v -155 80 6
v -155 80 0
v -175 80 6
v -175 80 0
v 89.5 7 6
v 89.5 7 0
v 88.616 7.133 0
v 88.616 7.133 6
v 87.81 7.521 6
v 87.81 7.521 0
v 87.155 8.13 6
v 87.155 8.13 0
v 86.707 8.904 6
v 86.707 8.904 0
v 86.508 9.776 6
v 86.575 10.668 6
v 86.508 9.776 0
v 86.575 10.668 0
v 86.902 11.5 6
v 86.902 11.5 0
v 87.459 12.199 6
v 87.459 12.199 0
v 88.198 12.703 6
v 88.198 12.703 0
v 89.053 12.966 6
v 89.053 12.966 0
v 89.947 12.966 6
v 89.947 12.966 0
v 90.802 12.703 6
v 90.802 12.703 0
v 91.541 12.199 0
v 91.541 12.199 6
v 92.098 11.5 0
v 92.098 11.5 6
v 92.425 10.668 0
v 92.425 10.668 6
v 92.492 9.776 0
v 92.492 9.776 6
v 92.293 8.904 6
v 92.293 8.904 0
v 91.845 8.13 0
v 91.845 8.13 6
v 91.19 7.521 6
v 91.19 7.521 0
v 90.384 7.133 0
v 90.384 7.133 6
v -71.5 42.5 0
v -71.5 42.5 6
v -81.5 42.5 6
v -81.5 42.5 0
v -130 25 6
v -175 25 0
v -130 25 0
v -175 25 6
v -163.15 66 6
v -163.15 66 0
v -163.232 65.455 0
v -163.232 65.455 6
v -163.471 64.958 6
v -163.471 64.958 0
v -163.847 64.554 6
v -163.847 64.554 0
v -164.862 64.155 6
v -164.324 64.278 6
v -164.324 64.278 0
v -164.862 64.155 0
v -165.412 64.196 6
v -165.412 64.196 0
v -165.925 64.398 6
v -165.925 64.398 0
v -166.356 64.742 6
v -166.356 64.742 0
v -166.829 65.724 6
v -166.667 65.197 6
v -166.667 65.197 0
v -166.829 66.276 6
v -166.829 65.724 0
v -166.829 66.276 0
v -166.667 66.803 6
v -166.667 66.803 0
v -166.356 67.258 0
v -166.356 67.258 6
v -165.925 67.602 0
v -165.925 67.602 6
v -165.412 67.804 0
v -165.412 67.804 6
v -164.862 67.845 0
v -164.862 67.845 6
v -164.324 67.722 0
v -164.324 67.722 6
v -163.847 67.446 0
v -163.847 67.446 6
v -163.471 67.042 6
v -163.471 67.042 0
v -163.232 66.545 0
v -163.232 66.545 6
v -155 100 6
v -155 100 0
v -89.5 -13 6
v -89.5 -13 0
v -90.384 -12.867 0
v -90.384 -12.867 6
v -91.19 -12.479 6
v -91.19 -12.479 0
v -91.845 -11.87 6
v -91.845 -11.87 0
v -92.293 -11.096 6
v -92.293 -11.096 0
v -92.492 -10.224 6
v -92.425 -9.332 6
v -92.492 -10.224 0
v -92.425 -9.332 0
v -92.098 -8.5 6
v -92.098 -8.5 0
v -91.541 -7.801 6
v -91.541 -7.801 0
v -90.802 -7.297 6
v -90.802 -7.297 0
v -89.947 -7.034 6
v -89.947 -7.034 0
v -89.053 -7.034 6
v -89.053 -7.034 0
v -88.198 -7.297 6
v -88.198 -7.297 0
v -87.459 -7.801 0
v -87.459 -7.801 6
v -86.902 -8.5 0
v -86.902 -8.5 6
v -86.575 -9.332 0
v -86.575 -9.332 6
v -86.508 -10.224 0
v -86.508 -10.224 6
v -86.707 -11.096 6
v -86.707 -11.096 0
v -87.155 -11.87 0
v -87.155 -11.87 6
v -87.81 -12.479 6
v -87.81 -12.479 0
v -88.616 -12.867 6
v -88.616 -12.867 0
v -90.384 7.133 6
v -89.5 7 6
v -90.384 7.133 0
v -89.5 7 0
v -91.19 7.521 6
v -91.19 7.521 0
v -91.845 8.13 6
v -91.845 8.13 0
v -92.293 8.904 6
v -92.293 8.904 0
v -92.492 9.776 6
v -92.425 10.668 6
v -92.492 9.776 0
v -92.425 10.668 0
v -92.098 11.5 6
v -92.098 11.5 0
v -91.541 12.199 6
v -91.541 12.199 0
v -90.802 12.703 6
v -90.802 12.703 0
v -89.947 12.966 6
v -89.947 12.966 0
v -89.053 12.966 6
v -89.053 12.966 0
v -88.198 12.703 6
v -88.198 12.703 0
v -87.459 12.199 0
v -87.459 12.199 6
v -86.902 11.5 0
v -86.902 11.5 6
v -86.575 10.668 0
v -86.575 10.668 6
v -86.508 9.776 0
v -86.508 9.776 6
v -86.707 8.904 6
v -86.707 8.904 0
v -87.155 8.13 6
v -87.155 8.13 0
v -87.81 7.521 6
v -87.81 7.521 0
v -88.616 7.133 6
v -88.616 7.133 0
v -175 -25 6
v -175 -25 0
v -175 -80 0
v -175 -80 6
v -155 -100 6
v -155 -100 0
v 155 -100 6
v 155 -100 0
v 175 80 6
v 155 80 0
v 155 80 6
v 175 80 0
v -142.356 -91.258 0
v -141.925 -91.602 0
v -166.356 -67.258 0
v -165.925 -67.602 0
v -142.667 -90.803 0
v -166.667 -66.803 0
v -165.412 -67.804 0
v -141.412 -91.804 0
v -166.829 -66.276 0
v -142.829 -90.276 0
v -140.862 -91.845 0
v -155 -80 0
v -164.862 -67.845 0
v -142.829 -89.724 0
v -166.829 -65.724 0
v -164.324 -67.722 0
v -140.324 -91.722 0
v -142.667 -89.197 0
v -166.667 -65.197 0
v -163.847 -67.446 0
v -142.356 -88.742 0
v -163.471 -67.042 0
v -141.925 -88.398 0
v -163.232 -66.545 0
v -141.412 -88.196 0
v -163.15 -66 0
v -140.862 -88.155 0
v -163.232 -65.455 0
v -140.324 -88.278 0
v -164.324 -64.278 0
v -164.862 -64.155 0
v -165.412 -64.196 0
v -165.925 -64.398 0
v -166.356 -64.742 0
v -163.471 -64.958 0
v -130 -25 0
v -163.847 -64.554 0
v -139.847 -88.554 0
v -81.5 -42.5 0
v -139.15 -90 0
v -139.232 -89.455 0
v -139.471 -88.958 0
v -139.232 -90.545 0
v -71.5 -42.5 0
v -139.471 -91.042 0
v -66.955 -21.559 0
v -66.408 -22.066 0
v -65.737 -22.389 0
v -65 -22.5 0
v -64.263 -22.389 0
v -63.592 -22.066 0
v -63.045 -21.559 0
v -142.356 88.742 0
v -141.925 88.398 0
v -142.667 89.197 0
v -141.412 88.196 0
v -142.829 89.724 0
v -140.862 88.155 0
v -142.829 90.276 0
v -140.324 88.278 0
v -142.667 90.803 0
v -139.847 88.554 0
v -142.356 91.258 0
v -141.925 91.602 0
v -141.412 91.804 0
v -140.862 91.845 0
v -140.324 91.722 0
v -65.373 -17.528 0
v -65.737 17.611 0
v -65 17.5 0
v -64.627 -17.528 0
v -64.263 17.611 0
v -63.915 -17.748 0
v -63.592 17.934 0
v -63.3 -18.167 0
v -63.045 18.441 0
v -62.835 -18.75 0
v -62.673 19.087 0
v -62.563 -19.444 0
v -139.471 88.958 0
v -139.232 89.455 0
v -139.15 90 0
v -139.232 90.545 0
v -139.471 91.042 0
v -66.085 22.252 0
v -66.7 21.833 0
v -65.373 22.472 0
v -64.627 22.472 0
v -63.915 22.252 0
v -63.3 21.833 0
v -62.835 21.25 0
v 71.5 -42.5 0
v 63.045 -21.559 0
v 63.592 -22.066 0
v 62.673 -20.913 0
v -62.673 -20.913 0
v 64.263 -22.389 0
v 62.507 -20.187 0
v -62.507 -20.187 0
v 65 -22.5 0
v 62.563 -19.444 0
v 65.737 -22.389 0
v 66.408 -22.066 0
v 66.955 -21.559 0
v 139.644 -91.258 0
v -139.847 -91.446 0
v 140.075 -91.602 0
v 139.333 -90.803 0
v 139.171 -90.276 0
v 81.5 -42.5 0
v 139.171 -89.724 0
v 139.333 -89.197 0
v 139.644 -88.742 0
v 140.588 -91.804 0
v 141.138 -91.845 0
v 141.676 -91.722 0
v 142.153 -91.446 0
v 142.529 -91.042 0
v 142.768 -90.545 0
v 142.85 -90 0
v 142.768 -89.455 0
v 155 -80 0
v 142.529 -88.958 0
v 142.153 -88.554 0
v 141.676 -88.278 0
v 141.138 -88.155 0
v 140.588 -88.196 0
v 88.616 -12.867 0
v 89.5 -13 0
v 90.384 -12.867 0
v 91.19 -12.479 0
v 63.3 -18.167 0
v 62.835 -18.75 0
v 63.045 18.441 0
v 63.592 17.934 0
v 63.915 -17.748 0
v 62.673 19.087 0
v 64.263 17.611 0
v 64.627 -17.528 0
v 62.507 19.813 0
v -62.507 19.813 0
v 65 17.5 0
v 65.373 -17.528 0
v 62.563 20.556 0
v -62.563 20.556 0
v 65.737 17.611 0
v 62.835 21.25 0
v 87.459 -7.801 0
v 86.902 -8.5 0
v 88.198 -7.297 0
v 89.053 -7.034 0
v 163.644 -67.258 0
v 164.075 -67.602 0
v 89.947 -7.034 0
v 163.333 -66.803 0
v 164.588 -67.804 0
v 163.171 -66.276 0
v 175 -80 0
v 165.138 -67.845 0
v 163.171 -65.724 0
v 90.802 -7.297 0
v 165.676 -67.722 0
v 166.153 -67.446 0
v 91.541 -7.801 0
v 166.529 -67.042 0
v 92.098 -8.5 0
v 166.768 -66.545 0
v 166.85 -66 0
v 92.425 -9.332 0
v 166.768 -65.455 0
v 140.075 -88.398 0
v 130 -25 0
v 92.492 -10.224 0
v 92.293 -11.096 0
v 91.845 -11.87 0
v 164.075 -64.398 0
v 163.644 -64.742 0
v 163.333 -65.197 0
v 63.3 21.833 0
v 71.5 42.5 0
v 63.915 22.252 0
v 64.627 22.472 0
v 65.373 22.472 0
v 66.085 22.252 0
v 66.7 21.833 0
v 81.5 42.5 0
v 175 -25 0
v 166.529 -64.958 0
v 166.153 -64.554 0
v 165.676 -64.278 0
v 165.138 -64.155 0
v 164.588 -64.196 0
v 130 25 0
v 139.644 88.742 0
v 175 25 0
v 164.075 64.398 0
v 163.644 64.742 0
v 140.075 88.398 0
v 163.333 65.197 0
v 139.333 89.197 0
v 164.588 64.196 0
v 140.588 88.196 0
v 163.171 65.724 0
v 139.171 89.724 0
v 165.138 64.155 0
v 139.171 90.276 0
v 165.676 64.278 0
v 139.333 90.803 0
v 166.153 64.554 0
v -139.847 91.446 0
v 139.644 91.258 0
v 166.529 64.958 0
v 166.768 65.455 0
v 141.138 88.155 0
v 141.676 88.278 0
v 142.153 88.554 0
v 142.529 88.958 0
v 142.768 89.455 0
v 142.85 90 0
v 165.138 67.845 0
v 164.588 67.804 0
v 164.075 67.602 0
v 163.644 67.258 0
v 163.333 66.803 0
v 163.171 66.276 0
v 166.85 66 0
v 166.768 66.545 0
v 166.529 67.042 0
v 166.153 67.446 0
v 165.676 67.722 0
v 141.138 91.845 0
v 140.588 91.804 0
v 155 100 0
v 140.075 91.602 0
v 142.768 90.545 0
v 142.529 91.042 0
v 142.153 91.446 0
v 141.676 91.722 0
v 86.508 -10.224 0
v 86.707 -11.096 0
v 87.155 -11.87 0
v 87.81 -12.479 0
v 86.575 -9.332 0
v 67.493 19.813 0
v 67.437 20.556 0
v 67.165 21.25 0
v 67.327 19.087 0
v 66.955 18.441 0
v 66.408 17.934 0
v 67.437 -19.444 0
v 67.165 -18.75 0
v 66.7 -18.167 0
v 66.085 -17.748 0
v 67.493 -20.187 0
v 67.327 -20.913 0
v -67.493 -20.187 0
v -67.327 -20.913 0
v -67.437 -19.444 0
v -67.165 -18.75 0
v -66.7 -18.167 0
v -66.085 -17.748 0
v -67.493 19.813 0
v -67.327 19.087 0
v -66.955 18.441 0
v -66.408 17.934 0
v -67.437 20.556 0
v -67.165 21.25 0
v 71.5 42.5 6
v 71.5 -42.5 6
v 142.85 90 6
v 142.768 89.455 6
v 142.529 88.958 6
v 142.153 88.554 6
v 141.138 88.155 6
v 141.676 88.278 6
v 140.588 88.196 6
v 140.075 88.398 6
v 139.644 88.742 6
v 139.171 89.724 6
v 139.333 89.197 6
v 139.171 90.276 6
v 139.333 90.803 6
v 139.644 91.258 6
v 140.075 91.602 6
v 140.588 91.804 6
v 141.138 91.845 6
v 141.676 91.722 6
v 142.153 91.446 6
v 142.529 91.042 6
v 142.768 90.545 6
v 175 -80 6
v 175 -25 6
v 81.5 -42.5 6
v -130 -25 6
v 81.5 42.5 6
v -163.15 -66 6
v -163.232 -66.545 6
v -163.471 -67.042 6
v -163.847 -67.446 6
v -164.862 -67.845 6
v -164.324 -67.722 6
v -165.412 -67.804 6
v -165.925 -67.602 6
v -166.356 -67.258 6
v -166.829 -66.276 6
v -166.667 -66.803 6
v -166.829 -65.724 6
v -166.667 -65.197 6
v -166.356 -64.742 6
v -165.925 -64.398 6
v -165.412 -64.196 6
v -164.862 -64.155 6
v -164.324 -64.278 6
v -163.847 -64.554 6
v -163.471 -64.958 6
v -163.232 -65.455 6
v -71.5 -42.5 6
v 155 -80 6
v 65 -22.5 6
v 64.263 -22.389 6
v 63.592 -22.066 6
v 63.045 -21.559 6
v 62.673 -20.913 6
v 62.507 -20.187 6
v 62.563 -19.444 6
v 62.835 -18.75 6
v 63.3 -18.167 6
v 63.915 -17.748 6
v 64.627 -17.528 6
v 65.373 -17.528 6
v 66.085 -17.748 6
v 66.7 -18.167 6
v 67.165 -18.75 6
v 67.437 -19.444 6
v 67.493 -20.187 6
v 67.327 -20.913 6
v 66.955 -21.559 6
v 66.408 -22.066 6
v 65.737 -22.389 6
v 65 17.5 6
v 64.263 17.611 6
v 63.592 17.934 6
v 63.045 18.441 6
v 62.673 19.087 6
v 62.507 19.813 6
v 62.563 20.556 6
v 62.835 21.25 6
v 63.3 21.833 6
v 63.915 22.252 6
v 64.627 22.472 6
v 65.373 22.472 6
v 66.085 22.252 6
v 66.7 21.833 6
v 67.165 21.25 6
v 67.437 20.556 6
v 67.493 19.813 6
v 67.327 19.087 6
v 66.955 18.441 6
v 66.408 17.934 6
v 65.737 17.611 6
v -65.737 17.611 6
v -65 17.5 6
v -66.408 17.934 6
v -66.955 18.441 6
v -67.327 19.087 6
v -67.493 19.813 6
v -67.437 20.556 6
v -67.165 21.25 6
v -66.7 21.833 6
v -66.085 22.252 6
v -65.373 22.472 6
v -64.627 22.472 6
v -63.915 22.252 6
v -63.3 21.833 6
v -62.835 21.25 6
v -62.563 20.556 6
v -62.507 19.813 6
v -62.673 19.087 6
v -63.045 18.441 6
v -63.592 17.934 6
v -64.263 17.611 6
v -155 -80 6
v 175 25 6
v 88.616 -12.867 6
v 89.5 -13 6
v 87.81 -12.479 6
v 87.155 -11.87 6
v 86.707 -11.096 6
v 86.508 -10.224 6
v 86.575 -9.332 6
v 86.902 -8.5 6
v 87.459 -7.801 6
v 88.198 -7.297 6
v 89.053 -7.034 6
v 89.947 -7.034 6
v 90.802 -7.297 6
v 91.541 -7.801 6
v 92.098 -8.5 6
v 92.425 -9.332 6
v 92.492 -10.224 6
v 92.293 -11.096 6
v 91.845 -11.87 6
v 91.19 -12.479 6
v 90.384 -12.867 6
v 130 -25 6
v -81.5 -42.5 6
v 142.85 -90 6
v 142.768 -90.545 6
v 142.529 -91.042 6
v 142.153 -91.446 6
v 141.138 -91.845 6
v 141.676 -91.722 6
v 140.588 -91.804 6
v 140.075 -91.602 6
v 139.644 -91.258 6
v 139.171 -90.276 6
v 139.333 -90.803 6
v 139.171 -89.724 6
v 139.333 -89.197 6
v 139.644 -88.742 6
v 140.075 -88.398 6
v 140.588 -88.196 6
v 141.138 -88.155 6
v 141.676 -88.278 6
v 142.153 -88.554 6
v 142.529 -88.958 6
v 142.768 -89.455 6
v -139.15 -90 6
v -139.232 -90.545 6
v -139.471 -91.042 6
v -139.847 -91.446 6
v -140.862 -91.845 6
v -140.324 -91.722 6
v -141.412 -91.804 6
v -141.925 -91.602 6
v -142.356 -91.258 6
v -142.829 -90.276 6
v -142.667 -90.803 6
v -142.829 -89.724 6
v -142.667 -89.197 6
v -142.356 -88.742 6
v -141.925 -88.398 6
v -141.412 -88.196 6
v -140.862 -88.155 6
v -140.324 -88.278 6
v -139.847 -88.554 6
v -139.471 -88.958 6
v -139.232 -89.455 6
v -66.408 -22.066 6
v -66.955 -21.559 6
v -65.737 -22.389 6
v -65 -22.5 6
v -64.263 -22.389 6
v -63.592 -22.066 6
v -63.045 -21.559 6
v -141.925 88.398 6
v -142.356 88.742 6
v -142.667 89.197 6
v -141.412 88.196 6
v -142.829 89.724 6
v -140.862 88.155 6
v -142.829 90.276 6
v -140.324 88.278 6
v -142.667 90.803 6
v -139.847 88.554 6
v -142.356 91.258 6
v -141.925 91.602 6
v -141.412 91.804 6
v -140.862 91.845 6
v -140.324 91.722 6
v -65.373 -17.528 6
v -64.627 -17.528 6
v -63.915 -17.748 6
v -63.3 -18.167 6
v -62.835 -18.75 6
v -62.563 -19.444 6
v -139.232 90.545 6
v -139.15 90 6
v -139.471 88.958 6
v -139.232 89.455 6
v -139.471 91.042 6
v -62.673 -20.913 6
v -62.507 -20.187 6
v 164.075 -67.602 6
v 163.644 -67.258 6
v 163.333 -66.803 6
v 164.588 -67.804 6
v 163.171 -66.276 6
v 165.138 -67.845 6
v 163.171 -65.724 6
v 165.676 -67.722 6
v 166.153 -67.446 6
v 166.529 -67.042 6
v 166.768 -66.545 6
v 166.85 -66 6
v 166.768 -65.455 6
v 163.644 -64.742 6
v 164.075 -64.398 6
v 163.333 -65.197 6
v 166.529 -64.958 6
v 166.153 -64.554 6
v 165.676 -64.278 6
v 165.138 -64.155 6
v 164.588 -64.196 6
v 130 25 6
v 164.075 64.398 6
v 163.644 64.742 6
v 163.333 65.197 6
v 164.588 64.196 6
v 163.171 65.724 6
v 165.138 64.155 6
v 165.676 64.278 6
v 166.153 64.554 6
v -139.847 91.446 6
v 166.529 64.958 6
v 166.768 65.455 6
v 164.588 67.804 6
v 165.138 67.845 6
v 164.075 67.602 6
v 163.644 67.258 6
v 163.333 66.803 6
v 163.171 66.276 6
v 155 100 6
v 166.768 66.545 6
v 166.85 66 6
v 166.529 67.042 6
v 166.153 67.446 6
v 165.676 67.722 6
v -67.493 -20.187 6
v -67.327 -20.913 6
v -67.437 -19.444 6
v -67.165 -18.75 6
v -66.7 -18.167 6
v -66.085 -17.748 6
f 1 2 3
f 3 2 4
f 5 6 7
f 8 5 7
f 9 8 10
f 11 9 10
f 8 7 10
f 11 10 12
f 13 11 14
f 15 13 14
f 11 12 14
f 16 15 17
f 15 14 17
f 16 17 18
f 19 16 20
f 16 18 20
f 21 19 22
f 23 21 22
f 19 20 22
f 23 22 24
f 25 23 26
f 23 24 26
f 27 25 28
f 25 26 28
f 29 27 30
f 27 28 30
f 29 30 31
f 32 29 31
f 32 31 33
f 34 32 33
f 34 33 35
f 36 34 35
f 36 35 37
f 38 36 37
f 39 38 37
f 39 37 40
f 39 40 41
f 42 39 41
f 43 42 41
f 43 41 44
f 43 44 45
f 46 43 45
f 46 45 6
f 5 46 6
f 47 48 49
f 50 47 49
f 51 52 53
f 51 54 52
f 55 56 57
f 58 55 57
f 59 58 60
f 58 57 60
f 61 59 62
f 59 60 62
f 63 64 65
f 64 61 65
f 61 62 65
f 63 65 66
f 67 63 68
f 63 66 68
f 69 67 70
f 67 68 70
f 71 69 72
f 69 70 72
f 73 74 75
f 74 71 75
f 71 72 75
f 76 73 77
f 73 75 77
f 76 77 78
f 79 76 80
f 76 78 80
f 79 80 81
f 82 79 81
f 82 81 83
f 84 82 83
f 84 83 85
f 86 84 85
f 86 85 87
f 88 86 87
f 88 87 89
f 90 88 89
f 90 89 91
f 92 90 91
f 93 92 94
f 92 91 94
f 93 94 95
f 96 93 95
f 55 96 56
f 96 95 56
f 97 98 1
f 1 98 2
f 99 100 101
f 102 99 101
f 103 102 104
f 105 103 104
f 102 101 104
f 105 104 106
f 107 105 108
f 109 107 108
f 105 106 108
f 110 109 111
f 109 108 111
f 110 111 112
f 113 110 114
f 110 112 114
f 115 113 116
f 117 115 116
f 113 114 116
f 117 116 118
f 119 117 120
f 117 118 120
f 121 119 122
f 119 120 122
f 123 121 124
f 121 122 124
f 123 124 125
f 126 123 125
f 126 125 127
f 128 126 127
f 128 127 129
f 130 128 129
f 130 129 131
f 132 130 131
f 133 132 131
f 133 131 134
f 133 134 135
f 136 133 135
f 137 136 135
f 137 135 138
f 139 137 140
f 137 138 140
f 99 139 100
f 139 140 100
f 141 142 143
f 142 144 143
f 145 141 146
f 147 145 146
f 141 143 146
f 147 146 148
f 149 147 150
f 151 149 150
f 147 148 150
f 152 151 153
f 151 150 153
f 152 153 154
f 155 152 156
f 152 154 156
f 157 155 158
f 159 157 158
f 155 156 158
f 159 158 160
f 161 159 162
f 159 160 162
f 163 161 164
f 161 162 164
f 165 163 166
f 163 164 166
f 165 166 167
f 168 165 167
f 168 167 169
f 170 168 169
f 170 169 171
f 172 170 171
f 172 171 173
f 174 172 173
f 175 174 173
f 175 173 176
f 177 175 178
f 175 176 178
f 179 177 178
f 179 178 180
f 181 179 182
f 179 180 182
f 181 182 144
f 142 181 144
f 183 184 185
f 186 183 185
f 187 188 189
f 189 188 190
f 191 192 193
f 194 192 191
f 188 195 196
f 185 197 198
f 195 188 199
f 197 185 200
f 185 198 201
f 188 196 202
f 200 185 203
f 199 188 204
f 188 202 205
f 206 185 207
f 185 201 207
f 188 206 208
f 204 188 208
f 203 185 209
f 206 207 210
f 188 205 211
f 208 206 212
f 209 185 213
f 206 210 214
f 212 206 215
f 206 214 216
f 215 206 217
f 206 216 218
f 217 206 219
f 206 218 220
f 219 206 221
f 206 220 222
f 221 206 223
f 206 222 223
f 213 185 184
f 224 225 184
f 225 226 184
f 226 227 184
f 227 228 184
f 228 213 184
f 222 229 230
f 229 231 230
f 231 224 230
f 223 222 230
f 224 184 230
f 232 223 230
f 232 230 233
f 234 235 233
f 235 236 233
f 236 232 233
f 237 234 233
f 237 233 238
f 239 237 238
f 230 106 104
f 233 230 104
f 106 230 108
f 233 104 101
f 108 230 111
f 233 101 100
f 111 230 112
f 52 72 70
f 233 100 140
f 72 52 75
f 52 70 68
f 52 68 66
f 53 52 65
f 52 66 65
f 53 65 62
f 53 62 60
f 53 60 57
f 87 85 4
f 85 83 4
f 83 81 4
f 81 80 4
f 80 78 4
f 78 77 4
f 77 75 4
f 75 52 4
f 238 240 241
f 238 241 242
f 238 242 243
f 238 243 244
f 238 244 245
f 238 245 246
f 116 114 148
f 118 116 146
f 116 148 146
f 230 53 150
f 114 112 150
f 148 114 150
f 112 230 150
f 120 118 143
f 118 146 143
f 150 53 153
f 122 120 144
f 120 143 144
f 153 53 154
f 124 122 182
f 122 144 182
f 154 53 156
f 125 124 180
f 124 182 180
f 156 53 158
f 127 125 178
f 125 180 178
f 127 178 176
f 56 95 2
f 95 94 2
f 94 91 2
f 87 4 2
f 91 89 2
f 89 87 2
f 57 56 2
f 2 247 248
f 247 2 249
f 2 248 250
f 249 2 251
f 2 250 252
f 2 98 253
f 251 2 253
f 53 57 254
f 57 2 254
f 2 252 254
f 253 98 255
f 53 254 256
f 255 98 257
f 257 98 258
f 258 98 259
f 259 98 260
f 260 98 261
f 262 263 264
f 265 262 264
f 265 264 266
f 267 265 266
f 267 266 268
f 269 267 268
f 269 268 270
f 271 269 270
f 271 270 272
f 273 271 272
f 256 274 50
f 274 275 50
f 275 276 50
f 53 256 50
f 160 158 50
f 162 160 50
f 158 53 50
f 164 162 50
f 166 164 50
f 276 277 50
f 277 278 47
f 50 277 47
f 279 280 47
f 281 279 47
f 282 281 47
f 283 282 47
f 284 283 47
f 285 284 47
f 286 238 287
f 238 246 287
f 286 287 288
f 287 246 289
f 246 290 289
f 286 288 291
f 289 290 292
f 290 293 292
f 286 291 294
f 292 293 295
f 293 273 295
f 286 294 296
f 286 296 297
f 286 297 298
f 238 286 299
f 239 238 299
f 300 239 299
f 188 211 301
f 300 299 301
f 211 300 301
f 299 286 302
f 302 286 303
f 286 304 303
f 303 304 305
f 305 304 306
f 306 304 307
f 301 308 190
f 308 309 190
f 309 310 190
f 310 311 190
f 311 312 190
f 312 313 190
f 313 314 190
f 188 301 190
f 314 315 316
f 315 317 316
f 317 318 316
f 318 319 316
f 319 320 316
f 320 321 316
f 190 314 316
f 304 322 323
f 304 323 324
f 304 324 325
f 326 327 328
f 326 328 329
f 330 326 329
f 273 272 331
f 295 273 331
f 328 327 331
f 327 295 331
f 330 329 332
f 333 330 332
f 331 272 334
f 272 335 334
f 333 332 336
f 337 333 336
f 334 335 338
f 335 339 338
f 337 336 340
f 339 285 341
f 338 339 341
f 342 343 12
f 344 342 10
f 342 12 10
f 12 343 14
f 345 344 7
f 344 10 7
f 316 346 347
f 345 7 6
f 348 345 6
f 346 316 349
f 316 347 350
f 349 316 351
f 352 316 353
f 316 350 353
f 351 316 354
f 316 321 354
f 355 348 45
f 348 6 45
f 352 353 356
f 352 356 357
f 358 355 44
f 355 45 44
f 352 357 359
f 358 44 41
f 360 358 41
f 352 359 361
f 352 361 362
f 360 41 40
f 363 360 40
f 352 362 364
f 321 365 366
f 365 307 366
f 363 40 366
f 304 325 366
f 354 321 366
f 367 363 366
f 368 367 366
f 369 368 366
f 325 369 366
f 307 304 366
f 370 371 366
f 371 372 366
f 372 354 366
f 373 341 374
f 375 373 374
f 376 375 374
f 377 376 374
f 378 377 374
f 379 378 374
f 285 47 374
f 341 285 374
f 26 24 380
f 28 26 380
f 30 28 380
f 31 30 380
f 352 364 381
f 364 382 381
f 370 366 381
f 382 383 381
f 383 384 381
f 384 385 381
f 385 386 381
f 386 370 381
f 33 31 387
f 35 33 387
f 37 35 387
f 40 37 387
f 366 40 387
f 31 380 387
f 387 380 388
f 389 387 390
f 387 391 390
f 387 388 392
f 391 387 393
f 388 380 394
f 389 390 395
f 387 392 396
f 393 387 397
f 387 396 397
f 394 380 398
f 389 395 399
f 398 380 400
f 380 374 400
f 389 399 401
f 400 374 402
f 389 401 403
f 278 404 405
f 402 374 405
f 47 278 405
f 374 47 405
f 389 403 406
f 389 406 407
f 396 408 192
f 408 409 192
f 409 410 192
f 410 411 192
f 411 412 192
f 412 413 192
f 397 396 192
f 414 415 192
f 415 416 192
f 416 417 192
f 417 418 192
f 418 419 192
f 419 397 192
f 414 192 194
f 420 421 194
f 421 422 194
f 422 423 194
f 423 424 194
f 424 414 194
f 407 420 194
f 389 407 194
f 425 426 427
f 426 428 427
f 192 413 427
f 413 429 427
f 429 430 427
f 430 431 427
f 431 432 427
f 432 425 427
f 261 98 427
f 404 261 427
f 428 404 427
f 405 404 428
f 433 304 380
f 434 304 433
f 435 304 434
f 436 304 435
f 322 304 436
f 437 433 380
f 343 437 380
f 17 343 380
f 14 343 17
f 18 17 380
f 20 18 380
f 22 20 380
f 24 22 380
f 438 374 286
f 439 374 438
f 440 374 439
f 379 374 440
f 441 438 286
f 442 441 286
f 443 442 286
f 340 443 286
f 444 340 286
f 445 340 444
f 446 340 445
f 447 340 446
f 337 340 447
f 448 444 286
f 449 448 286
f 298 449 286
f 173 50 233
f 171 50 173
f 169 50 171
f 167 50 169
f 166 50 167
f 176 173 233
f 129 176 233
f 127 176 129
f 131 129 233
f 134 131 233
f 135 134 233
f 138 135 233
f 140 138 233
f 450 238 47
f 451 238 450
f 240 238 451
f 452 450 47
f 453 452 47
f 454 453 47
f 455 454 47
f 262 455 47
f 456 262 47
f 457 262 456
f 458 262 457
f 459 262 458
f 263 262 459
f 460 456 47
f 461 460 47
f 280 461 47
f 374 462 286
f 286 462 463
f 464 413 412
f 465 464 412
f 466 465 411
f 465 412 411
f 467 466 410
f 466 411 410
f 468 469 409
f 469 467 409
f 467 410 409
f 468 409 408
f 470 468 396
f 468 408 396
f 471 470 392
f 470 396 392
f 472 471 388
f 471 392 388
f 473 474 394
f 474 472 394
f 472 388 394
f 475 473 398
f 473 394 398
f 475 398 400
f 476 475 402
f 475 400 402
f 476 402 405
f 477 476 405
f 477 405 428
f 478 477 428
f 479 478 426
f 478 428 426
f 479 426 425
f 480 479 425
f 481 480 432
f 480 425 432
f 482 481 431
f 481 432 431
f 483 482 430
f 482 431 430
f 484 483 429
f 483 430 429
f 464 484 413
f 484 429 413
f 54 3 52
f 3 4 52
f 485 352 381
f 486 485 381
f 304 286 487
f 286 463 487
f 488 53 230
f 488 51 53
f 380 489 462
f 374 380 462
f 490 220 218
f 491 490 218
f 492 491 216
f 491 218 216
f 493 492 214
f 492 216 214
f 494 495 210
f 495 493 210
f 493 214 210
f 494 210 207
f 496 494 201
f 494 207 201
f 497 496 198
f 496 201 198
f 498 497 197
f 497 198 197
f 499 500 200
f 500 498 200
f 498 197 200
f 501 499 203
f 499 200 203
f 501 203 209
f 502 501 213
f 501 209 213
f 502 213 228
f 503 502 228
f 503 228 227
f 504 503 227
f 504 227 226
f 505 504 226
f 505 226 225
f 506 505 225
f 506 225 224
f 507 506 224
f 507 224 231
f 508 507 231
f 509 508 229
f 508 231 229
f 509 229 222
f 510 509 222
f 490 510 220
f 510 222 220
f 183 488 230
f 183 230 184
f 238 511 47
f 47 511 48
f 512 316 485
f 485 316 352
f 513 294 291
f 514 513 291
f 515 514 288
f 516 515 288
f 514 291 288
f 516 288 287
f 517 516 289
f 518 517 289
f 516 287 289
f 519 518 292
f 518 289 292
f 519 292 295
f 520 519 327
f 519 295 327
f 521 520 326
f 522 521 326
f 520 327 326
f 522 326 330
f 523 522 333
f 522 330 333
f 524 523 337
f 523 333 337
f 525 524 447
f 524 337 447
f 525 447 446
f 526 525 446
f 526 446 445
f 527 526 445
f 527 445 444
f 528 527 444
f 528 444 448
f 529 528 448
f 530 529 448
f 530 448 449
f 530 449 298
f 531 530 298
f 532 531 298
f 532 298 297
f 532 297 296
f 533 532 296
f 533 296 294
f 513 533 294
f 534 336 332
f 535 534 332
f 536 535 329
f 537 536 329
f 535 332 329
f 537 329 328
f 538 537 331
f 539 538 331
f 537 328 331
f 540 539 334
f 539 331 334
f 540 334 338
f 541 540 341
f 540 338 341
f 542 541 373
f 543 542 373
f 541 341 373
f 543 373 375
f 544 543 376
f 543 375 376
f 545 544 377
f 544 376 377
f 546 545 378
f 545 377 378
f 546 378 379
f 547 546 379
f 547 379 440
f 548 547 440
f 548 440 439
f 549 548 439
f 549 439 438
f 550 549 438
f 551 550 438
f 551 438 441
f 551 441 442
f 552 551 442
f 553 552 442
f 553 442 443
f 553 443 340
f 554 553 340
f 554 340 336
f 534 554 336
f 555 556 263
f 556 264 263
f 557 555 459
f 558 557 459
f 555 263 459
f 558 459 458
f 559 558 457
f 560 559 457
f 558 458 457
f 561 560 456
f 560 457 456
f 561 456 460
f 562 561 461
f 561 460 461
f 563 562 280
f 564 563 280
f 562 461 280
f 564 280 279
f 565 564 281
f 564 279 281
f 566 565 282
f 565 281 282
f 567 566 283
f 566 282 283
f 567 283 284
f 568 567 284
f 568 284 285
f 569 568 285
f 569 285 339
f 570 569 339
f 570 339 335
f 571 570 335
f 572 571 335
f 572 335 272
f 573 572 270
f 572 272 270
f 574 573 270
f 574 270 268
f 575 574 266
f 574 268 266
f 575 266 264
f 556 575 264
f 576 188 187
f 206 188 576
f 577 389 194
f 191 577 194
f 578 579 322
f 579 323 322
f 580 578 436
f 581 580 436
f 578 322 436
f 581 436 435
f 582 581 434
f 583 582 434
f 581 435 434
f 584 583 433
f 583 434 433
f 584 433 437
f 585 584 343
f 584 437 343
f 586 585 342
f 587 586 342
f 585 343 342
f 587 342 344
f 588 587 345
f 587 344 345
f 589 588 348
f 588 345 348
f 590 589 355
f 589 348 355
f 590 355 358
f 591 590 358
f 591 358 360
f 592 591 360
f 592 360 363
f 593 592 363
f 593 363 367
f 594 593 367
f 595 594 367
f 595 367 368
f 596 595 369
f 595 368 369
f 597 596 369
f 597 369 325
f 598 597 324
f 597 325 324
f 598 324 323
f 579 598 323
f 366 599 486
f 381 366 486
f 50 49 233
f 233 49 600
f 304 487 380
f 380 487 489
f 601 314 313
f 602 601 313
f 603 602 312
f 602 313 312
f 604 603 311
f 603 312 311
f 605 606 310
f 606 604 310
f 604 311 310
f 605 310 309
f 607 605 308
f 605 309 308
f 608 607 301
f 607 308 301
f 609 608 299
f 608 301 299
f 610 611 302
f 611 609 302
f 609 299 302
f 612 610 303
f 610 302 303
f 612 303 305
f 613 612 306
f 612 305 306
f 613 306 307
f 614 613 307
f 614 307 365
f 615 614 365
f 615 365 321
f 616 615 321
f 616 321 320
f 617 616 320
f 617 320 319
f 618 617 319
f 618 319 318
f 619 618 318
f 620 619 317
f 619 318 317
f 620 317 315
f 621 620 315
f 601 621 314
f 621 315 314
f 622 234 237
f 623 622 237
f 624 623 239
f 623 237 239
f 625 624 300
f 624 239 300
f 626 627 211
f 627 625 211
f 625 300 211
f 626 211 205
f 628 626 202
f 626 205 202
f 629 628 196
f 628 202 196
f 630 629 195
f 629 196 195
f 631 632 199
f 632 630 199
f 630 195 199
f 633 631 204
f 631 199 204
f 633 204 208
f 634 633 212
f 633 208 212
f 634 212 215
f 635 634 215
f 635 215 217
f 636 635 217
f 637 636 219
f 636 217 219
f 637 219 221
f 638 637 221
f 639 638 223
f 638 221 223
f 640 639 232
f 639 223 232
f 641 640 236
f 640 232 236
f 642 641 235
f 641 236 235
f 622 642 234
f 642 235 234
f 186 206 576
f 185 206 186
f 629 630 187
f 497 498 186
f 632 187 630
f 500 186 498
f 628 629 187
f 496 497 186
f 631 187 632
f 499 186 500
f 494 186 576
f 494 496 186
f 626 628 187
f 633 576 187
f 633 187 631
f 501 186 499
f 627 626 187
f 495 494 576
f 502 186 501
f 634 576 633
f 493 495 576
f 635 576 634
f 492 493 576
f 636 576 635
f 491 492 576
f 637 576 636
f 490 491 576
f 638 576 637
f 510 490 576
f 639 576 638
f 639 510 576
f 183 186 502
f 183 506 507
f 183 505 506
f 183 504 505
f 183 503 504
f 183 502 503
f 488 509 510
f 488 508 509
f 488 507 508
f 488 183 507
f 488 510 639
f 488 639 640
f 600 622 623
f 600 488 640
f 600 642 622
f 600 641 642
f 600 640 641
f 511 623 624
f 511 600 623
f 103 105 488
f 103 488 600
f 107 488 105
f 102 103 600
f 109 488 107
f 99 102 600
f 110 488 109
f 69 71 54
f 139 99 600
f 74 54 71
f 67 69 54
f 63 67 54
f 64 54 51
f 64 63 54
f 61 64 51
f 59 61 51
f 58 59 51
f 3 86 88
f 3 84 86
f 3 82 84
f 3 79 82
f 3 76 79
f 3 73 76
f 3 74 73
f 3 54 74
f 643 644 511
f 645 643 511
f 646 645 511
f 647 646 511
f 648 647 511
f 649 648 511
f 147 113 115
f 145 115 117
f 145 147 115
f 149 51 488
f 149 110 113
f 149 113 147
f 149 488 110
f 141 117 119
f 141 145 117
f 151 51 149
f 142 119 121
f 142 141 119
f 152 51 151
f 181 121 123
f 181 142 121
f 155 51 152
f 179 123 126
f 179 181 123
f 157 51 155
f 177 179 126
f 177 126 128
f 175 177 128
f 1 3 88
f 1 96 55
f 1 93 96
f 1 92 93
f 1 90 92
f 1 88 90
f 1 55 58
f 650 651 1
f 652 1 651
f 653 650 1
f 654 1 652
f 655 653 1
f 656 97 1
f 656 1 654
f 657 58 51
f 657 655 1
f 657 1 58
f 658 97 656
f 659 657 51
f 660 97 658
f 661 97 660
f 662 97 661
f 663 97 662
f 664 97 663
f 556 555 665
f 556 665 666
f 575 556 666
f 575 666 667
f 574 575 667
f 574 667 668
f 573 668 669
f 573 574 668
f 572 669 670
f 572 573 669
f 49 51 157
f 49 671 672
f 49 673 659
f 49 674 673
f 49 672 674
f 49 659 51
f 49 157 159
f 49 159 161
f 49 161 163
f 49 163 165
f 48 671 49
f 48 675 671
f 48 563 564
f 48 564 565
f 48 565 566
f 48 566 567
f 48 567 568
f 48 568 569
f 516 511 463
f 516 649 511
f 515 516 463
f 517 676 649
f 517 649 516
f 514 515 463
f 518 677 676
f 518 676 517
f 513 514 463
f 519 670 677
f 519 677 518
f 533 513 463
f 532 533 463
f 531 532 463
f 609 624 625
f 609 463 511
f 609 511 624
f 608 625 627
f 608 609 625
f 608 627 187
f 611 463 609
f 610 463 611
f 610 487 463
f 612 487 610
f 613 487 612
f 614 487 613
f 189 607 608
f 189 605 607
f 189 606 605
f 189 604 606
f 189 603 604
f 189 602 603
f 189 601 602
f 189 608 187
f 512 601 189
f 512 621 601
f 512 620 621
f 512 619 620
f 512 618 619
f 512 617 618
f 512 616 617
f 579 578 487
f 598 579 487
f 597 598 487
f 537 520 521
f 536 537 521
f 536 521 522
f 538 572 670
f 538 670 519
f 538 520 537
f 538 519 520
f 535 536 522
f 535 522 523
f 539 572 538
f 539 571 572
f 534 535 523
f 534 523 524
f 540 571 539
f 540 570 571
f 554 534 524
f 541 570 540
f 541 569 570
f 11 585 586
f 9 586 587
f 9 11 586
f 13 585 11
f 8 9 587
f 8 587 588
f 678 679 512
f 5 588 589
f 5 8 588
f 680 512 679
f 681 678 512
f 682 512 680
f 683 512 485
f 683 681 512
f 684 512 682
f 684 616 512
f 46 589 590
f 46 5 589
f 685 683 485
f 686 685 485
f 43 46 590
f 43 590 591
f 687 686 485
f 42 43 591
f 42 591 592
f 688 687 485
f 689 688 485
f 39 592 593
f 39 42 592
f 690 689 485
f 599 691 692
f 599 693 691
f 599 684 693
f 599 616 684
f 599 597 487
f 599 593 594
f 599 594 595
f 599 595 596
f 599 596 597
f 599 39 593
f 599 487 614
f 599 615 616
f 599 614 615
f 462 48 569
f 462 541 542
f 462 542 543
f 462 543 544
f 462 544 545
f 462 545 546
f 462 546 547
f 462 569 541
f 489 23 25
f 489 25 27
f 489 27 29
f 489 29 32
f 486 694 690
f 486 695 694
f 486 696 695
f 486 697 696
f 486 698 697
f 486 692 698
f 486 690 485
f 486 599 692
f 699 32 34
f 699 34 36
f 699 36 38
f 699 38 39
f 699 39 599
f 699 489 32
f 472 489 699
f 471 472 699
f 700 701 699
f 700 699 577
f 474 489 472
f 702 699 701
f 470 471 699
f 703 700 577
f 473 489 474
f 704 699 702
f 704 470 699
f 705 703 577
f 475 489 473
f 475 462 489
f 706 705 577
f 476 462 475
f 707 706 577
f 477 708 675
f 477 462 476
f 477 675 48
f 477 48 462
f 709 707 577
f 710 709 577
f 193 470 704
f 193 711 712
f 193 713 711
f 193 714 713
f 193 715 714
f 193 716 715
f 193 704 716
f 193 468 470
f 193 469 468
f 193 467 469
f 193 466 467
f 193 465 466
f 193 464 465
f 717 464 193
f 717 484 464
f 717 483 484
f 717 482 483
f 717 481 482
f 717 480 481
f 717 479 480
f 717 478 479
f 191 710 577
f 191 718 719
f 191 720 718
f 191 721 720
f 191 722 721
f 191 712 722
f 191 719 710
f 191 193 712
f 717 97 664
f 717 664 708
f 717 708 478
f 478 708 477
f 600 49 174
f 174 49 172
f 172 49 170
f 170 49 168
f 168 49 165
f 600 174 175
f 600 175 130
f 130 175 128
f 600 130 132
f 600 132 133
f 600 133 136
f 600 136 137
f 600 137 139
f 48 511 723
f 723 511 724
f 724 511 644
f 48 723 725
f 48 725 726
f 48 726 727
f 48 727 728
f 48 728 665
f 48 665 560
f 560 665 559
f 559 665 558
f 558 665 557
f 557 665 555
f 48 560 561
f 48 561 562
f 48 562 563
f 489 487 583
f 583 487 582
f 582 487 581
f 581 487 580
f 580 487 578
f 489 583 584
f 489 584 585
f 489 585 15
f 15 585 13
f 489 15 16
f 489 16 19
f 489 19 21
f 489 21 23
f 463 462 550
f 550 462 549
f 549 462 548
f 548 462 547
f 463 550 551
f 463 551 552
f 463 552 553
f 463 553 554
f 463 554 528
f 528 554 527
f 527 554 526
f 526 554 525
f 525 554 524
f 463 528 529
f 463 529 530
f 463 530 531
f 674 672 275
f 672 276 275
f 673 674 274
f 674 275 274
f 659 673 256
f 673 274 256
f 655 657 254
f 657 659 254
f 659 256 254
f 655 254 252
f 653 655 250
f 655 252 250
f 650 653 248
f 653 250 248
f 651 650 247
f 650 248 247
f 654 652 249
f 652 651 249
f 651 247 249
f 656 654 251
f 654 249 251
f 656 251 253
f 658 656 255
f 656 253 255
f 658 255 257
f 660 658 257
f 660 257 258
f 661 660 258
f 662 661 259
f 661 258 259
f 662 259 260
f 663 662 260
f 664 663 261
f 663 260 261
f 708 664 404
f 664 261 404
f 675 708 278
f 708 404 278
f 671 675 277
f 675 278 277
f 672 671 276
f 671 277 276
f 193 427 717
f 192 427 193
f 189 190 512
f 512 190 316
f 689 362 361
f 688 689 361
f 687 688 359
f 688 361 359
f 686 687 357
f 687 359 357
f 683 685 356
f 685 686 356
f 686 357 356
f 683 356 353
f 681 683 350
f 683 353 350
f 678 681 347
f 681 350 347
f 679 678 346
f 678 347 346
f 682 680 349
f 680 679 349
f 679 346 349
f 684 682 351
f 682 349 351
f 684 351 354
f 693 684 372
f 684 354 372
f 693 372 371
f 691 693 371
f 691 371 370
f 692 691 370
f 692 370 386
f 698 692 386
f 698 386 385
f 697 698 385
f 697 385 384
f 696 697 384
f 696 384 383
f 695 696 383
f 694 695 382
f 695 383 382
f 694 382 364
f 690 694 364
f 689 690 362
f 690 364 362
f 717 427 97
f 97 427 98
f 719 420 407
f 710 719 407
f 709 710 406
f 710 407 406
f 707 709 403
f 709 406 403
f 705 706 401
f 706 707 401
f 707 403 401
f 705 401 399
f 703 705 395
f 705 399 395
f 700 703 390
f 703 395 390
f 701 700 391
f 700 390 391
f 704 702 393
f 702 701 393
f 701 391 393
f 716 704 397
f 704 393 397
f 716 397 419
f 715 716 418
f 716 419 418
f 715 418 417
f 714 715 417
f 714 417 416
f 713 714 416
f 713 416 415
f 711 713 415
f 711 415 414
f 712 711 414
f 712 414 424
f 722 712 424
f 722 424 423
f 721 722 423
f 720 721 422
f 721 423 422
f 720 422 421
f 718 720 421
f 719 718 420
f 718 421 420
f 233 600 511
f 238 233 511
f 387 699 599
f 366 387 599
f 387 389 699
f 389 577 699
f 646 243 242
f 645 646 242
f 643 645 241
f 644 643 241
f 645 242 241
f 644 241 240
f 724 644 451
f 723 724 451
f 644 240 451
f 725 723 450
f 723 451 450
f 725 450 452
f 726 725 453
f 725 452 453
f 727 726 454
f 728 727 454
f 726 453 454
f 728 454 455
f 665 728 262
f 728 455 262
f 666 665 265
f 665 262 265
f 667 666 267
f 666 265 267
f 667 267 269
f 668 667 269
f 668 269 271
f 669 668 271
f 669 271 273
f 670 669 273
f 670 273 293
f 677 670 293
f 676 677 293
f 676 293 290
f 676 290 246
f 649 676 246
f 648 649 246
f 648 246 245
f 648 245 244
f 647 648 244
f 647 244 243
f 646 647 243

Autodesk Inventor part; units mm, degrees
ref_plane "YZ Plane" through (0, 0, 0) normal (1, 0, 0) x (0, 1, 0)
ref_plane "XZ Plane" through (0, 0, 0) normal (0, 1, 0) x (-1, 0, 0)
ref_plane "XY Plane" through (0, 0, 0) normal (0, 0, 1) x (1, 0, 0)
sketch "Esquisse1" plane through (0, 0, 0) normal (0, 0, 1) x (1, 0, 0)
  line L0 (-155, -100) -> (155, -100)
  line L1 (175, -80) -> (175, 80)
  line L2 (155, 100) -> (-155, 100)
  line L3 (-175, 80) -> (-175, -80)
  line L4 (-175, -100) -> (175, 100) construction
  line L5 (175, -100) -> (-175, 100) construction
  line L6 (-155, 100) -> (-155, 80)
  line L7 (-155, 80) -> (-175, 80)
  line L8 (155, 100) -> (155, 80)
  line L9 (155, 80) -> (175, 80)
  line L10 (155, -100) -> (155, -80)
  line L11 (155, -80) -> (175, -80)
  line L12 (-155, -100) -> (-155, -80)
  line L13 (-155, -80) -> (-175, -80)
  circle A0 centre (-141, 90) radius 1.85
  circle A1 centre (-165, 66) radius 1.85
  circle A2 centre (-165, -66) radius 1.85
  circle A3 centre (-141, -90) radius 1.85
  circle A4 centre (141, 90) radius 1.85
  circle A5 centre (165, 66) radius 1.85
  circle A6 centre (165, -66) radius 1.85
  circle A7 centre (141, -90) radius 1.85
  point P0 (0, 0)
  dimension "d43" = 350
  dimension "d44" = 200
  dimension "d45" = 20
  dimension "d46" = 20
  dimension "d47" = 20
  dimension "d48" = 20
  dimension "d49" = 20
  dimension "d50" = 20
  dimension "d51" = 20
  dimension "d52" = 20
  dimension "d53" = 3.7
  dimension "d54" = 3.7
  dimension "d55" = 3.7
  dimension "d56" = 3.7
  dimension "d57" = 3.7
  dimension "d58" = 3.7
  dimension "d59" = 3.7
  dimension "d60" = 3.7
  dimension "d61" = 10
  dimension "d62" = 10
  dimension "d63" = 10
  dimension "d64" = 10
  dimension "d65" = 10
  dimension "d66" = 10
  dimension "d67" = 10
  dimension "d68" = 10
  dimension "d69" = 14
  dimension "d70" = 14
  dimension "d71" = 14
  dimension "d72" = 14
  dimension "d73" = 14
  dimension "d74" = 14
  dimension "d136" = 14
  dimension "d137" = 14
extrude "Extrusion2" add sketch "Esquisse1" along normal blind 6
sketch "Esquisse3" plane through (0, 0, 6) normal (0, 0, 1) x (1, 0, 0)
  line L0 (175, -80) -> (175, 80) projected
  line L1 (175, -25) -> (175, 25)
  line L2 (175, 25) -> (130, 25)
  line L3 (130, 25) -> (130, -25)
  line L4 (130, -25) -> (175, -25)
  line L5 (155, 100) -> (-155, 100) projected
  line L6 (-175, -80) -> (-175, 80) projected
  line L7 (-175, -25) -> (-175, 25)
  line L8 (-175, 25) -> (-130, 25)
  line L9 (-130, 25) -> (-130, -25)
  line L10 (-130, -25) -> (-175, -25)
  point P0 (0, 0)
  dimension "d77" = 45
  dimension "d78" = 50
  dimension "d79" = 75
  dimension "d80" = 50
  dimension "d81" = 45
extrude "Extrusion3" cut sketch "Esquisse3" against normal blind 6
sketch "Esquisse4" plane through (0, 0, 6) normal (0, 0, 1) x (1, 0, 0)
  circle A0 centre (-89.5, 10) radius 3
  circle A1 centre (-89.5, -10) radius 3
  circle A2 centre (89.5, 10) radius 3
  circle A3 centre (89.5, -10) radius 3
  line L0 (-175, 80) -> (-175, 25) projected
  line L1 (-175, -25) -> (-175, -80) projected
  line L2 (175, 25) -> (175, 80) projected
  line L3 (175, -80) -> (175, -25) projected
  line L4 (155, 100) -> (-155, 100) projected
  line L5 (-155, -100) -> (155, -100) projected
  point P0 (0, 0)
  dimension "d84" = 6
  dimension "d85" = 6
  dimension "d86" = 6
  dimension "d87" = 6
  dimension "d88" = 85.5
  dimension "d89" = 85.5
  dimension "d90" = 85.5
  dimension "d91" = 85.5
  dimension "d92" = 90
  dimension "d93" = 90
  dimension "d94" = 90
  dimension "d95" = 90
hole "Perçage2" at (-89.5, 10, 6) at (-89.5, -10, 6) at (89.5, 10, 6) at (89.5, -10, 6) direction (0, 0, -1) diameter 6 depth 8 tip angle 118
sketch "Esquisse5" plane through (0, 0, 6) normal (0, 0, 1) x (1, 0, 0)
  line L0 (-81.5, -42.5) -> (-71.5, -42.5)
  line L1 (-71.5, -42.5) -> (-71.5, 42.5)
  line L2 (-71.5, 42.5) -> (-81.5, 42.5)
  line L3 (-81.5, 42.5) -> (-81.5, -42.5)
  line L4 (-81.5, -42.5) -> (-71.5, 42.5) construction
  line L5 (-71.5, -42.5) -> (-81.5, 42.5) construction
  line L6 (-175, -25) -> (-175, -80) projected
  line L7 (71.5, -42.5) -> (81.5, -42.5)
  line L8 (81.5, -42.5) -> (81.5, 42.5)
  line L9 (81.5, 42.5) -> (71.5, 42.5)
  line L10 (71.5, 42.5) -> (71.5, -42.5)
  line L11 (71.5, -42.5) -> (81.5, 42.5) construction
  line L12 (81.5, -42.5) -> (71.5, 42.5) construction
  line L13 (130, 25) -> (130, -25) projected
  line L14 (175, -80) -> (175, -25) projected
  line L15 (-155, -100) -> (155, -100) projected
  point P0 (0, 0)
  point P1 (-76.5, 0)
  point P2 (76.5, 0)
  dimension "d103" = 10
  dimension "d104" = 85
  dimension "d107" = 10
  dimension "d108" = 85
  dimension "d111" = 100
  dimension "d112" = 100
  dimension "d134" = 93.5
  dimension "d135" = 93.5
extrude "Extrusion4" cut sketch "Esquisse5" against normal blind 6
sketch "Esquisse6" plane through (0, 0, 6) normal (0, 0, 1) x (1, 0, 0)
  circle A0 centre (-65, 20) radius 2.5
  circle A1 centre (-65, -20) radius 2.5
  circle A2 centre (65, 20) radius 2.5
  circle A3 centre (65, -20) radius 2.5
  line L0 (175, 25) -> (175, 80) projected
  line L1 (175, -80) -> (175, -25) projected
  line L2 (-175, 80) -> (-175, 25) projected
  line L3 (-175, -25) -> (-175, -80) projected
  line L4 (155, 100) -> (-155, 100) projected
  line L5 (-155, -100) -> (155, -100) projected
  point P0 (0, 0)
  dimension "d115" = 5
  dimension "d116" = 5
  dimension "d117" = 5
  dimension "d118" = 5
  dimension "d119" = 110
  dimension "d120" = 110
  dimension "d121" = 110
  dimension "d122" = 110
  dimension "d123" = 80
  dimension "d124" = 80
  dimension "d125" = 80
  dimension "d126" = 80
hole "Perçage3" at (-65, 20, 6) at (-65, -20, 6) at (65, 20, 6) at (65, -20, 6) direction (0, 0, -1) diameter 5 depth 8 tip angle 118
equation "\"d45\" = d51"
equation "\"d46\" = d51"
equation "\"d47\" = d52"
equation "\"d48\" = d51"
equation "\"d49\" = d52"
equation "\"d50\" = d52"
equation "\"d52\" = d51"
equation "\"d54\" = d53"
equation "\"d55\" = d53"
equation "\"d56\" = d53"
equation "\"d57\" = d53"
equation "\"d58\" = d53"
equation "\"d59\" = d53"
equation "\"d60\" = d53"
equation "\"d61\" = d62"
equation "\"d63\" = d62"
equation "\"d64\" = d62"
equation "\"d65\" = d62"
equation "\"d66\" = d62"
equation "\"d67\" = d62"
equation "\"d68\" = d62"
equation "\"d70\" = d69"
equation "\"d71\" = d69"
equation "\"d72\" = d69"
equation "\"d73\" = d69"
equation "\"d74\" = d69"
equation "\"d136\" = d74"
equation "\"d137\" = d69"
equation "\"d85\" = d84"
equation "\"d86\" = d84"
equation "\"d87\" = d84"
equation "\"d89\" = d88"
equation "\"d90\" = d88"
equation "\"d91\" = d88"
equation "\"d93\" = d92"
equation "\"d94\" = d92"
equation "\"d95\" = d93"
properties part number "base" material "Bois (cerisier)"
